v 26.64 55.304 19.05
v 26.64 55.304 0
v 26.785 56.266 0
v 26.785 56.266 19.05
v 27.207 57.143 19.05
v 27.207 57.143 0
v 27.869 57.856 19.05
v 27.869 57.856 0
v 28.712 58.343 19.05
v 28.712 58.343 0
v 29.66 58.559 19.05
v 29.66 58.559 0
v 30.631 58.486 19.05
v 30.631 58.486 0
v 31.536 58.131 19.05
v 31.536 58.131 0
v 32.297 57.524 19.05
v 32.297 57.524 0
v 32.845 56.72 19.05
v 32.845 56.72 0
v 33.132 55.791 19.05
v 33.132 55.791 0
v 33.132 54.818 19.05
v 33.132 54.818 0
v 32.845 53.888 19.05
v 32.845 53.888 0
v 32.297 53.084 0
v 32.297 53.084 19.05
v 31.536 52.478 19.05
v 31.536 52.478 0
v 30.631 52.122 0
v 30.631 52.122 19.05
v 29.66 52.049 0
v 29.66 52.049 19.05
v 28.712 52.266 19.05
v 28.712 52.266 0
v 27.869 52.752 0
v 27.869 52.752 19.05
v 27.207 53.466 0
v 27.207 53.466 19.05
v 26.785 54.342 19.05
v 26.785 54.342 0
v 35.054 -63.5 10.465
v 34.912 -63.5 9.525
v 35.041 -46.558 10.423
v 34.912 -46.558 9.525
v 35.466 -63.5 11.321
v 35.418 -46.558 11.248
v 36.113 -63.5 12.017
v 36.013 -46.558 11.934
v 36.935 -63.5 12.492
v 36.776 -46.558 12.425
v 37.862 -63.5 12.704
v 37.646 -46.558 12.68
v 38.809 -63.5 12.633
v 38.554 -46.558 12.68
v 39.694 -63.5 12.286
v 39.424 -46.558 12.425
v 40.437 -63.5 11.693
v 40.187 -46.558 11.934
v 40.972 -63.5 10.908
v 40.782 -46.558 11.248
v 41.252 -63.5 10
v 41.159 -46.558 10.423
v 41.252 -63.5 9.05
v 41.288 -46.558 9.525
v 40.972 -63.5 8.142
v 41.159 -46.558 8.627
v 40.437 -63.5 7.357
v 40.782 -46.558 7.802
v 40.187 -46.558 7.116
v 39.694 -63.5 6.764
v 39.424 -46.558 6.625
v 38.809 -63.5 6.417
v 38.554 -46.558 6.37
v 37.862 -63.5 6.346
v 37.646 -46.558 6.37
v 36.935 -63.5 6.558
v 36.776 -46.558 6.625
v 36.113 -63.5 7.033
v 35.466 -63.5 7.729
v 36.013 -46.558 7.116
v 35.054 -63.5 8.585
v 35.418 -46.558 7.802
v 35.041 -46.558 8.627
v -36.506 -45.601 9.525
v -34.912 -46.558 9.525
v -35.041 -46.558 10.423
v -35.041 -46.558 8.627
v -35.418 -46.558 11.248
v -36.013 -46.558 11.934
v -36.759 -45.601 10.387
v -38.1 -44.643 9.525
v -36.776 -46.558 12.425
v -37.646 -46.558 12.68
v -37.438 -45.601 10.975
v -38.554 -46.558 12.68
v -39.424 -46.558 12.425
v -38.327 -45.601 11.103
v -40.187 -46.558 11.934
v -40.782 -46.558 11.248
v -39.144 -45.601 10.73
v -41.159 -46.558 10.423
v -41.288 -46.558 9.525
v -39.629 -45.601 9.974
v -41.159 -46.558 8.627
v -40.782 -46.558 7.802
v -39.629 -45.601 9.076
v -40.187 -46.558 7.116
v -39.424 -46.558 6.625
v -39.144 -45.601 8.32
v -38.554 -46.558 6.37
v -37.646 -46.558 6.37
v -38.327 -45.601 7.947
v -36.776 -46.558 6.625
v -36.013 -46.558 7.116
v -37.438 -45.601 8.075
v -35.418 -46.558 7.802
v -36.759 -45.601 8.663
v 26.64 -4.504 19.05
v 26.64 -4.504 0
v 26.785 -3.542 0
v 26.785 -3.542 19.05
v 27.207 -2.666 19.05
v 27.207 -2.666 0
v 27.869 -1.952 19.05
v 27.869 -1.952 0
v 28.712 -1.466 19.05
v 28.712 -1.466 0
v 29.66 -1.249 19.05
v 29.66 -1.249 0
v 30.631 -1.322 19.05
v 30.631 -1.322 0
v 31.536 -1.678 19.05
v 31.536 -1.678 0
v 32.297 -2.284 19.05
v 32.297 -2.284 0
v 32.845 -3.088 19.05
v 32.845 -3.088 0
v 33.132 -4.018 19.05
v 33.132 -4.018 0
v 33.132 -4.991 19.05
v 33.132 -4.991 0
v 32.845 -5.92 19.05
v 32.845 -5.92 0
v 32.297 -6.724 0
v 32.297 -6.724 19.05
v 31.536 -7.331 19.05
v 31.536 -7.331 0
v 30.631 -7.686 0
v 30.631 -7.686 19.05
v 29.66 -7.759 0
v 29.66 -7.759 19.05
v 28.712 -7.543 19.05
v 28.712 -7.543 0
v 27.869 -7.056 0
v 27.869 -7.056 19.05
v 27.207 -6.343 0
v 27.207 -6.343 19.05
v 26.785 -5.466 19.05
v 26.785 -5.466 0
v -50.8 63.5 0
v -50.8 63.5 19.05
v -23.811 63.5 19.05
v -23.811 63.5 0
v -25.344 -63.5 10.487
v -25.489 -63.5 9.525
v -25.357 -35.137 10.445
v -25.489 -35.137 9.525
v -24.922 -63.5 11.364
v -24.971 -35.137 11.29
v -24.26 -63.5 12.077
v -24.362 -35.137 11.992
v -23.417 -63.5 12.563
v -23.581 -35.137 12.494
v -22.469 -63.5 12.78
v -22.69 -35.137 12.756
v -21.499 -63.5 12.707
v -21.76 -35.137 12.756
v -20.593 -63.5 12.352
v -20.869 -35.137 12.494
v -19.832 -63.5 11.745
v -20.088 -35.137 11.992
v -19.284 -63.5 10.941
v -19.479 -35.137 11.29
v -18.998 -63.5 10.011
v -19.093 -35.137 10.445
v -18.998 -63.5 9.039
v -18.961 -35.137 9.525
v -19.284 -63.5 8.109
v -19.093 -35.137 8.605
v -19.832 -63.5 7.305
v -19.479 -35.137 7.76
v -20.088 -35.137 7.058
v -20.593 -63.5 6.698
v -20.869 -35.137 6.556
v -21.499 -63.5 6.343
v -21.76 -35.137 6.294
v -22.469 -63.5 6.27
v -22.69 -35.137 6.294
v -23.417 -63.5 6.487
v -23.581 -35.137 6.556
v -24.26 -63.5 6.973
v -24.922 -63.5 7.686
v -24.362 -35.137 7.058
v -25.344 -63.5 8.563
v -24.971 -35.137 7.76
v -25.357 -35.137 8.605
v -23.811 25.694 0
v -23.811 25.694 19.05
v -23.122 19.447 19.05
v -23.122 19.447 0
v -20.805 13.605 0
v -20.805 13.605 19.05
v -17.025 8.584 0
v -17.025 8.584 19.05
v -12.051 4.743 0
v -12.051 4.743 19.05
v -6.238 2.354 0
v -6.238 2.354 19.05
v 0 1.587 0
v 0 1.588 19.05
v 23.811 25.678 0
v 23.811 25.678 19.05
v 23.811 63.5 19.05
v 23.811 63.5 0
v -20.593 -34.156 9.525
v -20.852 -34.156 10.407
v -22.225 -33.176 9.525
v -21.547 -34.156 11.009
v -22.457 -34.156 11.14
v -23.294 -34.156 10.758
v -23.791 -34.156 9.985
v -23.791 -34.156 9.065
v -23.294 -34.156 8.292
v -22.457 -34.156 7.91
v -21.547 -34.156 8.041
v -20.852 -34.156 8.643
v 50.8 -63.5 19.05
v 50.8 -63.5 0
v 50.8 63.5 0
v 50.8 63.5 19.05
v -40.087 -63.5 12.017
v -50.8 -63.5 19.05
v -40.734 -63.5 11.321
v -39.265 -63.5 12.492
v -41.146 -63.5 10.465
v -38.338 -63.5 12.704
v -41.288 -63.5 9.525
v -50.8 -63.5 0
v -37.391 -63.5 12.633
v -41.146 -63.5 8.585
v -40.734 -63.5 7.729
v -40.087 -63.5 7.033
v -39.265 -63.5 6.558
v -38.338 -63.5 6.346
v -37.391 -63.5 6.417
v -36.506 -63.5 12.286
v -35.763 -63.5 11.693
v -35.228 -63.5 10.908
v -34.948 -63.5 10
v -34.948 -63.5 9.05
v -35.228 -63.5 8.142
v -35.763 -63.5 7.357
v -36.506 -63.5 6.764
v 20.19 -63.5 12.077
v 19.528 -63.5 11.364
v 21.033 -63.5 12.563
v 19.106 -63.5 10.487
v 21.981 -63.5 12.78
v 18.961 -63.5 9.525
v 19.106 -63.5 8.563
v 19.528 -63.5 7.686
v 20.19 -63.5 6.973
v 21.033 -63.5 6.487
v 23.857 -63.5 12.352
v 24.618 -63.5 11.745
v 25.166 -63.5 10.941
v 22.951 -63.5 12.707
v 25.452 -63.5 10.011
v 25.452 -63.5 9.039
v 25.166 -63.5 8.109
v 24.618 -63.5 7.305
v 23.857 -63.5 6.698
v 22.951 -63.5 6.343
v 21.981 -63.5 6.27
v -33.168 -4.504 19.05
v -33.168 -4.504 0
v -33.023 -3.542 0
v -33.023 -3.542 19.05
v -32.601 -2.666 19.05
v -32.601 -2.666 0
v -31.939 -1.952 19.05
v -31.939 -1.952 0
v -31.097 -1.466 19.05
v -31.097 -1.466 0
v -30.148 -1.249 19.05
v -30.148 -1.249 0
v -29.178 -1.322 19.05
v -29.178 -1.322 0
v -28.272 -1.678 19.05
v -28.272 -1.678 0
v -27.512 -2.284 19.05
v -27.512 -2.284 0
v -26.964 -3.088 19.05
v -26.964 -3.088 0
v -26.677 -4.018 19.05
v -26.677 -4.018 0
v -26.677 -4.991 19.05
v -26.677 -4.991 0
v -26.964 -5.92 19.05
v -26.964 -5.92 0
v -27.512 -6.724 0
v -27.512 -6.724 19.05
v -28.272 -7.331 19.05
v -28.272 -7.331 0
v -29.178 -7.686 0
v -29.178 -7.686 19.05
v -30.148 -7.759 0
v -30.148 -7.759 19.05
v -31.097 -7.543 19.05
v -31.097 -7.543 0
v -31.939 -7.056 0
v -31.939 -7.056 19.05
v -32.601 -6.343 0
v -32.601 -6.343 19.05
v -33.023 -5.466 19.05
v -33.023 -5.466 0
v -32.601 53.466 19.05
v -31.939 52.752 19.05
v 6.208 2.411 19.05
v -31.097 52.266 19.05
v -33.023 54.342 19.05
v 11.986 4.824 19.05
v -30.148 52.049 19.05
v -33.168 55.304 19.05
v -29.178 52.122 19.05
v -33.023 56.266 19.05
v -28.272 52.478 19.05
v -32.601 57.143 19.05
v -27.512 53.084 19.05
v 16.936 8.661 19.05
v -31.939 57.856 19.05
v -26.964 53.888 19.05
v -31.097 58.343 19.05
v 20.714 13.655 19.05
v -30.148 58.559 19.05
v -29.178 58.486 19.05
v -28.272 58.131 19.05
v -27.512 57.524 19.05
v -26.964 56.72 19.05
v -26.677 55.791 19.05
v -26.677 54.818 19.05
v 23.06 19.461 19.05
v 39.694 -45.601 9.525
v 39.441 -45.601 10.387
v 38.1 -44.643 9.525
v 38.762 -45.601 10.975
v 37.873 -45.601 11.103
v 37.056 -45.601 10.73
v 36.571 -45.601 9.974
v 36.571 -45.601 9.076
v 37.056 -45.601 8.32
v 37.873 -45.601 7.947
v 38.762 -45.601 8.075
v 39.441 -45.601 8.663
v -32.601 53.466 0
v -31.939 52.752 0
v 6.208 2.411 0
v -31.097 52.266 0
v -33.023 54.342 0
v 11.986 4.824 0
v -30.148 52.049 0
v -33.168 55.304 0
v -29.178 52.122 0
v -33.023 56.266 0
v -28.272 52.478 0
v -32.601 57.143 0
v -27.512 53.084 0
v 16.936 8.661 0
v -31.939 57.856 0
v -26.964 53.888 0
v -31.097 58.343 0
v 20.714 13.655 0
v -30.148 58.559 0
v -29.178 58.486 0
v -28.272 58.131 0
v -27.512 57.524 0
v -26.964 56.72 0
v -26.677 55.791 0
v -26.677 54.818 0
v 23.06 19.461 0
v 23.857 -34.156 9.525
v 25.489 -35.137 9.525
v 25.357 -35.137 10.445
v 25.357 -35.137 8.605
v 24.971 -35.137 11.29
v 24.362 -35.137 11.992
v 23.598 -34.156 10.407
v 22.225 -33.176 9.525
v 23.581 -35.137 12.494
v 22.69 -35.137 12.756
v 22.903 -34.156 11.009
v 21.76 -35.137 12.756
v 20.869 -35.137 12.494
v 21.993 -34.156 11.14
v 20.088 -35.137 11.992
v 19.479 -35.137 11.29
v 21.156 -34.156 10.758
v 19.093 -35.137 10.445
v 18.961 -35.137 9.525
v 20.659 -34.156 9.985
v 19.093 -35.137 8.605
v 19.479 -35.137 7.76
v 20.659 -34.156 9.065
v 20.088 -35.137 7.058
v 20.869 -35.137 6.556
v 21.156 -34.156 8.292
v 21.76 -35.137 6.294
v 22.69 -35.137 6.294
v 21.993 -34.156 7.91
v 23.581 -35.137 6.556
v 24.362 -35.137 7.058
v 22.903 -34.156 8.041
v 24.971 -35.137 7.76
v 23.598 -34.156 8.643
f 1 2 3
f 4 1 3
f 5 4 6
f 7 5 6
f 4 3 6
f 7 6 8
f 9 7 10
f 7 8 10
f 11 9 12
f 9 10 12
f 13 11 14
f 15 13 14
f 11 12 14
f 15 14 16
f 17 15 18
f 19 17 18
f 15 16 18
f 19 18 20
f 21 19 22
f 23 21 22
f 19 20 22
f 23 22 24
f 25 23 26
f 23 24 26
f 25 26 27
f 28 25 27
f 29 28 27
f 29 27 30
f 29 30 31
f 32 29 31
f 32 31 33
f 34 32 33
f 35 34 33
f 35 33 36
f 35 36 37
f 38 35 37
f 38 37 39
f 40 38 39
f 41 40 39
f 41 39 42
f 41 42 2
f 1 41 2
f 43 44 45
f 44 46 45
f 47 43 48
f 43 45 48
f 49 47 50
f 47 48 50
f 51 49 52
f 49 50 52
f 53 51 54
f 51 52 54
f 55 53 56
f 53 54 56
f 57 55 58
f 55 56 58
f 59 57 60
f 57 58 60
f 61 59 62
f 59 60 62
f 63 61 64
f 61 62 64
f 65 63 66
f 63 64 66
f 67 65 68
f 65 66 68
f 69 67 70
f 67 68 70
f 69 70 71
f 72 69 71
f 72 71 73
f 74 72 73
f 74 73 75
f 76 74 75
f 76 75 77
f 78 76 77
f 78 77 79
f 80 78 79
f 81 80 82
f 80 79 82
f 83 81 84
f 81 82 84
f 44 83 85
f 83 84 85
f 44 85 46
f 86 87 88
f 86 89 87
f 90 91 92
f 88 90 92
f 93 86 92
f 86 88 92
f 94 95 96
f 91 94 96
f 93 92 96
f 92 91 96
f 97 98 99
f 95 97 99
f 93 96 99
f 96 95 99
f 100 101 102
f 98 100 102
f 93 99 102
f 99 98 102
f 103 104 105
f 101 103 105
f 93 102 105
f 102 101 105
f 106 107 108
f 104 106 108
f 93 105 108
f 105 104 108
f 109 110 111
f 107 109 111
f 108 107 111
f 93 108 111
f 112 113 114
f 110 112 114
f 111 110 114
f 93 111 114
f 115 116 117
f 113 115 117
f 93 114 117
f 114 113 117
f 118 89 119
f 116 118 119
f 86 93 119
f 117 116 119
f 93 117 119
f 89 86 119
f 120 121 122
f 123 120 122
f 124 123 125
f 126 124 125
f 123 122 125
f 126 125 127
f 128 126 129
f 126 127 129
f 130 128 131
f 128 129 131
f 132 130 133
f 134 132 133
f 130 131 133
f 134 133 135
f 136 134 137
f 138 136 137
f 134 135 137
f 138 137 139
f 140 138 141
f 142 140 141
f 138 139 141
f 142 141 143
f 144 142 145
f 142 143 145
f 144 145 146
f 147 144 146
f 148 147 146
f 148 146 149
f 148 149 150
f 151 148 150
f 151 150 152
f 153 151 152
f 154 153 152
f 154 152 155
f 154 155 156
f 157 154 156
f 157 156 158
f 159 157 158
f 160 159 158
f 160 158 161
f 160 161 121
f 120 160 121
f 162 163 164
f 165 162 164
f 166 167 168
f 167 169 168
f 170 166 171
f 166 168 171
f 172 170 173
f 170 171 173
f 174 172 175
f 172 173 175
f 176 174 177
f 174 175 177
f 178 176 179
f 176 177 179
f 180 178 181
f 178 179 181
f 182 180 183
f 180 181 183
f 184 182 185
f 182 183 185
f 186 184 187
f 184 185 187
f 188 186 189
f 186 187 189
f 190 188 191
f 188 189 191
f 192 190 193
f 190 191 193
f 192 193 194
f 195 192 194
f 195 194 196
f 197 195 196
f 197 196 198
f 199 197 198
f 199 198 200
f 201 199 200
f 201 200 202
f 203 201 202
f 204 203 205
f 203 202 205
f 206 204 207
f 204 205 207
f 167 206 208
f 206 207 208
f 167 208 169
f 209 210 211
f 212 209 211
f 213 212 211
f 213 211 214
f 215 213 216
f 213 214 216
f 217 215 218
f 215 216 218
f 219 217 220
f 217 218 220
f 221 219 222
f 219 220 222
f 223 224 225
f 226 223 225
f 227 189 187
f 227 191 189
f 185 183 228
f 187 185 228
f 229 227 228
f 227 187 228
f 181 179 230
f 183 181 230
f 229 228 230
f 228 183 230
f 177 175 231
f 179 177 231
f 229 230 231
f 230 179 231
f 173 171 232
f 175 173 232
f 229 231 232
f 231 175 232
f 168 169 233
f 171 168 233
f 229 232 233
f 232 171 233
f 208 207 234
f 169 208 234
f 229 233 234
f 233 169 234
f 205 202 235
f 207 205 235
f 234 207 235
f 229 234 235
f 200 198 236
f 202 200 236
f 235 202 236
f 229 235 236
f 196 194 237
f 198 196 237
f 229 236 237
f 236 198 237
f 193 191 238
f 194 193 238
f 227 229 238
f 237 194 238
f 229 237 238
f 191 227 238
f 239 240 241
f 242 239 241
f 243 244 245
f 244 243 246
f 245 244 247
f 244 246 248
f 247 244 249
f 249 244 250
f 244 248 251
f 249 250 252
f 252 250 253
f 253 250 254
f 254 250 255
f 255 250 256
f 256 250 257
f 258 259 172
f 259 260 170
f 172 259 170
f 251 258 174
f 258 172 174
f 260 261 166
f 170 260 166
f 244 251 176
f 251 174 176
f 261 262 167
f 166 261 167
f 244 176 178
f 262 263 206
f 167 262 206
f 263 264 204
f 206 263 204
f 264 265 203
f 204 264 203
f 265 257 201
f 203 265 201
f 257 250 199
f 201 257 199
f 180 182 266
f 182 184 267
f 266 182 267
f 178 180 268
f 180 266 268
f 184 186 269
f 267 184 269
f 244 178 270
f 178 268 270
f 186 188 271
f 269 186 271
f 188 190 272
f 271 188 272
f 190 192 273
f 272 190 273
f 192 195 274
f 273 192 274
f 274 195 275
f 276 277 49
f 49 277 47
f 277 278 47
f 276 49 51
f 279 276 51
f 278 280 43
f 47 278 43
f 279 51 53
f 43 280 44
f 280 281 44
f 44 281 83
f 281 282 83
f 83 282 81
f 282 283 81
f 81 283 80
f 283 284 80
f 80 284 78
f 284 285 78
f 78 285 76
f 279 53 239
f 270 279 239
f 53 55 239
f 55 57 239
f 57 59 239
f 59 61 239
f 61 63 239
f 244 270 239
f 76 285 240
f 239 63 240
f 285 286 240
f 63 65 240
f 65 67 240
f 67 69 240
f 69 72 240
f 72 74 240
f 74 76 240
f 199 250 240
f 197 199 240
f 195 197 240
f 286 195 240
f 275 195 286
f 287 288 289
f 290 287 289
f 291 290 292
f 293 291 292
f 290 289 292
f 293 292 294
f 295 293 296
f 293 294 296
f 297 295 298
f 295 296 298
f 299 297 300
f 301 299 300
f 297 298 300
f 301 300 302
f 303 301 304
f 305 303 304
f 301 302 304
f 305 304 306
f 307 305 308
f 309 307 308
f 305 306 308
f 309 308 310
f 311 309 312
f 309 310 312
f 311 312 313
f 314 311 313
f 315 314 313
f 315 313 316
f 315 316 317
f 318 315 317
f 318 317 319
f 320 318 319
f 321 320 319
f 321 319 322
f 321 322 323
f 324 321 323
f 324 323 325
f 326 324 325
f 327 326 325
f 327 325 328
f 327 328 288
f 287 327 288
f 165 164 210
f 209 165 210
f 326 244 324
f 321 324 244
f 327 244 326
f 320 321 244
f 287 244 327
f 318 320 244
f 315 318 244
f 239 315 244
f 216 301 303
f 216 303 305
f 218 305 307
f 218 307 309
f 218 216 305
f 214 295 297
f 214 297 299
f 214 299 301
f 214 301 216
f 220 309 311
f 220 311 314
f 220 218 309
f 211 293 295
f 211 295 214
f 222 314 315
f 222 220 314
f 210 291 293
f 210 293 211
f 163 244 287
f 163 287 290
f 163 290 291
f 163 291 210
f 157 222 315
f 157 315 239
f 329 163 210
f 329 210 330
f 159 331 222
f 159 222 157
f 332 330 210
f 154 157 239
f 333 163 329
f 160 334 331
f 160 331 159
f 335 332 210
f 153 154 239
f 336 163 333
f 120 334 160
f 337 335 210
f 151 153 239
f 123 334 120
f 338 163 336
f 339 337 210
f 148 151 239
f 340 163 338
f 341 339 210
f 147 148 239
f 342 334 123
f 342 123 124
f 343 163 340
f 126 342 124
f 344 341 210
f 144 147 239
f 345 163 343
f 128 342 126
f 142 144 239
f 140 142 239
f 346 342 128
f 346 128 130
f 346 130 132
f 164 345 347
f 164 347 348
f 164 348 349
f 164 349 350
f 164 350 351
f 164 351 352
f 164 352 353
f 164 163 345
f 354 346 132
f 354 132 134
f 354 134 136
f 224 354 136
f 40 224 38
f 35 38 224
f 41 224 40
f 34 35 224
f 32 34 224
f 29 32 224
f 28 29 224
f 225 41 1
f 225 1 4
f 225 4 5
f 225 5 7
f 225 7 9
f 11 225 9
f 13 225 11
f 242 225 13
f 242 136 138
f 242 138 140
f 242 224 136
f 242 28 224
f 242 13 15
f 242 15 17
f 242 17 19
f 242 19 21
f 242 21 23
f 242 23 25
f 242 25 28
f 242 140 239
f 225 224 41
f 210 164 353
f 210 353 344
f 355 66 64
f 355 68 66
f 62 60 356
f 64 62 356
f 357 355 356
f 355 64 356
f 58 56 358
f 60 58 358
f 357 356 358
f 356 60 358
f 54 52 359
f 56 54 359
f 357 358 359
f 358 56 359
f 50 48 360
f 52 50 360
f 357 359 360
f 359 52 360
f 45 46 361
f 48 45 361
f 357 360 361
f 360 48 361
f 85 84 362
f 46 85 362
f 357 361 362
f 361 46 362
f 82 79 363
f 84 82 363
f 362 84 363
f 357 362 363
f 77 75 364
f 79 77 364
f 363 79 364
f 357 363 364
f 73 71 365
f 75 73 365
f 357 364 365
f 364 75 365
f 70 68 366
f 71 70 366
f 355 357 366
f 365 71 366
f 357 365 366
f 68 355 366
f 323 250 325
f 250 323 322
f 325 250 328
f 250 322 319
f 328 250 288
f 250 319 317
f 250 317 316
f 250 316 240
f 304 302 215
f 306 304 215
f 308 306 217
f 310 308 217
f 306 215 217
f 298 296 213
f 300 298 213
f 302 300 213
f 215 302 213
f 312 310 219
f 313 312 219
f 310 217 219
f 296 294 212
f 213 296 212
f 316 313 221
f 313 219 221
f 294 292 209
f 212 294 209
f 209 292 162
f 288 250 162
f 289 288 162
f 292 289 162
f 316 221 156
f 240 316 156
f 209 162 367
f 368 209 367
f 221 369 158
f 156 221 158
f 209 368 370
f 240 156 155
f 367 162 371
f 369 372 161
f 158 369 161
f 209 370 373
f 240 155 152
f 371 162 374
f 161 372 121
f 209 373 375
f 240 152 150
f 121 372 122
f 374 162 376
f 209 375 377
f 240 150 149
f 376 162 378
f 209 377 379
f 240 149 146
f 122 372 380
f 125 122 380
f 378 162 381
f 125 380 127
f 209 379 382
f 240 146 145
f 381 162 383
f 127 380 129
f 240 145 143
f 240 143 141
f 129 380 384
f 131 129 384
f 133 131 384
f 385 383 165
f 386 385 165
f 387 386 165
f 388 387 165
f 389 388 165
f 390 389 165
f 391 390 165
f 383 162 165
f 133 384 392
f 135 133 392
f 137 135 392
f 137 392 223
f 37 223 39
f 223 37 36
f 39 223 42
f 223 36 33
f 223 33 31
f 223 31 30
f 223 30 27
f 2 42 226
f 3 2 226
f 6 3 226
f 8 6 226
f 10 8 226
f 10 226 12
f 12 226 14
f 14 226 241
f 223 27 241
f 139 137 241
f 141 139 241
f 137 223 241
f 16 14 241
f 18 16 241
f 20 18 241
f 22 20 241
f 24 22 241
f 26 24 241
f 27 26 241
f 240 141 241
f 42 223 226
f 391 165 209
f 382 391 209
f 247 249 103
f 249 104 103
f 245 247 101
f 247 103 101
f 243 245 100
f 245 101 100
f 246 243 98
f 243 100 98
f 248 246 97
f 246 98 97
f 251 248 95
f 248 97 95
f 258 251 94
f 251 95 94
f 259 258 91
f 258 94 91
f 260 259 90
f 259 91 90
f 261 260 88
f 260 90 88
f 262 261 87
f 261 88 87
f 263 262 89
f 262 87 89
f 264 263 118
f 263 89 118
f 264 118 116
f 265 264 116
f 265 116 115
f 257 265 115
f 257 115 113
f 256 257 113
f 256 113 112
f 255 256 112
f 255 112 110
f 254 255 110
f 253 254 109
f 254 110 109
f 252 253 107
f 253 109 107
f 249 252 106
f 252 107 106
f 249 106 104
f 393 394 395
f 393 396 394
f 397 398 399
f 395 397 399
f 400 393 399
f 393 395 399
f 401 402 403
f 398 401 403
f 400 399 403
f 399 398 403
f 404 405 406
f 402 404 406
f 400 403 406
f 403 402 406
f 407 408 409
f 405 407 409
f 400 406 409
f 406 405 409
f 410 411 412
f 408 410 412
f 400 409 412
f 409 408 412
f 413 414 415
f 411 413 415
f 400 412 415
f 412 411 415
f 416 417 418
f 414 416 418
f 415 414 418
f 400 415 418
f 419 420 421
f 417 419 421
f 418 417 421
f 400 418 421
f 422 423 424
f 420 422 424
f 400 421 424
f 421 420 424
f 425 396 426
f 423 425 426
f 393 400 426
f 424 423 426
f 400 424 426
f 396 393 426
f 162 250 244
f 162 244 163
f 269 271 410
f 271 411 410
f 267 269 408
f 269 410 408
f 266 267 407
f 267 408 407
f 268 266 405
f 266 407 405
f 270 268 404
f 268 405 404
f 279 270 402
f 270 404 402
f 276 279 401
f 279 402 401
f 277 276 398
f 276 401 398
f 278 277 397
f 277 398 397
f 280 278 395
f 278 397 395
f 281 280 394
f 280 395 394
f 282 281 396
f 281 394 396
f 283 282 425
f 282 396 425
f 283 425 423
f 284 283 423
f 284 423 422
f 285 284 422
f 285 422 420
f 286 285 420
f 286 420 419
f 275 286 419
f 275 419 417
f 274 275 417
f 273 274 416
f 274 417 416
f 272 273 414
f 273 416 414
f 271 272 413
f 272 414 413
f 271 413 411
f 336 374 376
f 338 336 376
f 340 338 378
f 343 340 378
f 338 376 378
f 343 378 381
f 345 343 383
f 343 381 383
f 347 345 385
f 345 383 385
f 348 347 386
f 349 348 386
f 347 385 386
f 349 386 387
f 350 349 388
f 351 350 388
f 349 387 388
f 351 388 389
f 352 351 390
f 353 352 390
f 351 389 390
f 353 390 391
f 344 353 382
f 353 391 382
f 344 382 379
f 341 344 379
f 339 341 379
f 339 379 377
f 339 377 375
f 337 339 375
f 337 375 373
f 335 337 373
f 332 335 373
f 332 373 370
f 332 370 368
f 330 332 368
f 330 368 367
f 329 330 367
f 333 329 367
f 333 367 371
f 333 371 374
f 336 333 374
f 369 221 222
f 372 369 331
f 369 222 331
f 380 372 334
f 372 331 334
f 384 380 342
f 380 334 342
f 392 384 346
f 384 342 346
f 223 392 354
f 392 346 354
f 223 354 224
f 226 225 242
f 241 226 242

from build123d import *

# Parameters (mm, degrees)
F0_W      = 101.6
F0_H      = 152.4
F1_DEPTH  = 19.05
F3_D      = 6.5278
F2_R      = 23.8125
F4_DEPTH  = 19.051
F6_DEPTH  = 19.051
F7_W      = 101.6
F7_H      = 25.4
F8_DEPTH  = 19.051
F10_D     = 6.3754
F10_DEPTH = 16.9418
F10_TIP   = 1.9153633953
F11_D     = 6.5278
F11_DEPTH = 28.3633333333
F11_TIP   = 1.9611489744


with BuildPart() as f1:
    # F0 (on Top) → F1 (new body)
    with BuildSketch(Plane.XY):
        with Locations((0, 12.7)):
            Rectangle(F0_W, F0_H)
    extrude(amount=F1_DEPTH)

    # F3 (through all)
    with Locations(Plane.XY.offset(19.05)):
        with Locations((-29.9042528832, 55.3042528832), (29.9042528832, 55.3042528832), (29.9042528832, -4.5042528832), (-29.9042528832, -4.5042528832)):
            Hole(F3_D / 2)

    # F2 (on face) → F4 (cut, through all)
    with BuildSketch(Plane.XY.offset(19.05)):
        with Locations((0, 25.4)):
            Circle(F2_R)
    extrude(amount=-F4_DEPTH, mode=Mode.SUBTRACT)

    # F5 (on face) → F6 (cut, through all)
    with BuildSketch(Plane.XY.offset(19.05)):
        with BuildLine():
            Line((-23.8106845457, 88.9), (-23.8106845457, 25.6940369276))
            ThreePointArc((-23.8106845457, 25.6940369276), (-17.0245539834, 8.5843833211), (0, 1.5875))
            ThreePointArc((0, 1.5875), (16.8536210319, 8.7422088532), (23.81087373, 25.6782956372))
            Line((23.81087373, 25.6782956372), (23.81087373, 88.9))
            Line((23.81087373, 88.9), (-23.8106845457, 88.9))
        make_face()
    extrude(amount=-F6_DEPTH, mode=Mode.SUBTRACT)

    # F7 (on face) → F8 (cut, through all)
    with BuildSketch(Plane.XY.offset(19.05)):
        with Locations((0, 76.2)):
            Rectangle(F7_W, F7_H)
    extrude(amount=-F8_DEPTH, mode=Mode.SUBTRACT)

    # F10
    with Locations(Plane.XZ.offset(63.5)):
        with Locations((-38.1, 9.525), (38.1, 9.525)):
            Hole(F10_D / 2, depth=F10_DEPTH)
            with Locations((0, 0, -(F10_DEPTH + F10_TIP / 2))):  # 118° drill point
                Cone(0, F10_D / 2, F10_TIP, mode=Mode.SUBTRACT)

    # F11
    with Locations(Plane.XZ.offset(63.5)):
        with Locations((-22.225, 9.525), (22.225, 9.525)):
            Hole(F11_D / 2, depth=F11_DEPTH)
            with Locations((0, 0, -(F11_DEPTH + F11_TIP / 2))):  # 118° drill point
                Cone(0, F11_D / 2, F11_TIP, mode=Mode.SUBTRACT)


solid = f1.part
